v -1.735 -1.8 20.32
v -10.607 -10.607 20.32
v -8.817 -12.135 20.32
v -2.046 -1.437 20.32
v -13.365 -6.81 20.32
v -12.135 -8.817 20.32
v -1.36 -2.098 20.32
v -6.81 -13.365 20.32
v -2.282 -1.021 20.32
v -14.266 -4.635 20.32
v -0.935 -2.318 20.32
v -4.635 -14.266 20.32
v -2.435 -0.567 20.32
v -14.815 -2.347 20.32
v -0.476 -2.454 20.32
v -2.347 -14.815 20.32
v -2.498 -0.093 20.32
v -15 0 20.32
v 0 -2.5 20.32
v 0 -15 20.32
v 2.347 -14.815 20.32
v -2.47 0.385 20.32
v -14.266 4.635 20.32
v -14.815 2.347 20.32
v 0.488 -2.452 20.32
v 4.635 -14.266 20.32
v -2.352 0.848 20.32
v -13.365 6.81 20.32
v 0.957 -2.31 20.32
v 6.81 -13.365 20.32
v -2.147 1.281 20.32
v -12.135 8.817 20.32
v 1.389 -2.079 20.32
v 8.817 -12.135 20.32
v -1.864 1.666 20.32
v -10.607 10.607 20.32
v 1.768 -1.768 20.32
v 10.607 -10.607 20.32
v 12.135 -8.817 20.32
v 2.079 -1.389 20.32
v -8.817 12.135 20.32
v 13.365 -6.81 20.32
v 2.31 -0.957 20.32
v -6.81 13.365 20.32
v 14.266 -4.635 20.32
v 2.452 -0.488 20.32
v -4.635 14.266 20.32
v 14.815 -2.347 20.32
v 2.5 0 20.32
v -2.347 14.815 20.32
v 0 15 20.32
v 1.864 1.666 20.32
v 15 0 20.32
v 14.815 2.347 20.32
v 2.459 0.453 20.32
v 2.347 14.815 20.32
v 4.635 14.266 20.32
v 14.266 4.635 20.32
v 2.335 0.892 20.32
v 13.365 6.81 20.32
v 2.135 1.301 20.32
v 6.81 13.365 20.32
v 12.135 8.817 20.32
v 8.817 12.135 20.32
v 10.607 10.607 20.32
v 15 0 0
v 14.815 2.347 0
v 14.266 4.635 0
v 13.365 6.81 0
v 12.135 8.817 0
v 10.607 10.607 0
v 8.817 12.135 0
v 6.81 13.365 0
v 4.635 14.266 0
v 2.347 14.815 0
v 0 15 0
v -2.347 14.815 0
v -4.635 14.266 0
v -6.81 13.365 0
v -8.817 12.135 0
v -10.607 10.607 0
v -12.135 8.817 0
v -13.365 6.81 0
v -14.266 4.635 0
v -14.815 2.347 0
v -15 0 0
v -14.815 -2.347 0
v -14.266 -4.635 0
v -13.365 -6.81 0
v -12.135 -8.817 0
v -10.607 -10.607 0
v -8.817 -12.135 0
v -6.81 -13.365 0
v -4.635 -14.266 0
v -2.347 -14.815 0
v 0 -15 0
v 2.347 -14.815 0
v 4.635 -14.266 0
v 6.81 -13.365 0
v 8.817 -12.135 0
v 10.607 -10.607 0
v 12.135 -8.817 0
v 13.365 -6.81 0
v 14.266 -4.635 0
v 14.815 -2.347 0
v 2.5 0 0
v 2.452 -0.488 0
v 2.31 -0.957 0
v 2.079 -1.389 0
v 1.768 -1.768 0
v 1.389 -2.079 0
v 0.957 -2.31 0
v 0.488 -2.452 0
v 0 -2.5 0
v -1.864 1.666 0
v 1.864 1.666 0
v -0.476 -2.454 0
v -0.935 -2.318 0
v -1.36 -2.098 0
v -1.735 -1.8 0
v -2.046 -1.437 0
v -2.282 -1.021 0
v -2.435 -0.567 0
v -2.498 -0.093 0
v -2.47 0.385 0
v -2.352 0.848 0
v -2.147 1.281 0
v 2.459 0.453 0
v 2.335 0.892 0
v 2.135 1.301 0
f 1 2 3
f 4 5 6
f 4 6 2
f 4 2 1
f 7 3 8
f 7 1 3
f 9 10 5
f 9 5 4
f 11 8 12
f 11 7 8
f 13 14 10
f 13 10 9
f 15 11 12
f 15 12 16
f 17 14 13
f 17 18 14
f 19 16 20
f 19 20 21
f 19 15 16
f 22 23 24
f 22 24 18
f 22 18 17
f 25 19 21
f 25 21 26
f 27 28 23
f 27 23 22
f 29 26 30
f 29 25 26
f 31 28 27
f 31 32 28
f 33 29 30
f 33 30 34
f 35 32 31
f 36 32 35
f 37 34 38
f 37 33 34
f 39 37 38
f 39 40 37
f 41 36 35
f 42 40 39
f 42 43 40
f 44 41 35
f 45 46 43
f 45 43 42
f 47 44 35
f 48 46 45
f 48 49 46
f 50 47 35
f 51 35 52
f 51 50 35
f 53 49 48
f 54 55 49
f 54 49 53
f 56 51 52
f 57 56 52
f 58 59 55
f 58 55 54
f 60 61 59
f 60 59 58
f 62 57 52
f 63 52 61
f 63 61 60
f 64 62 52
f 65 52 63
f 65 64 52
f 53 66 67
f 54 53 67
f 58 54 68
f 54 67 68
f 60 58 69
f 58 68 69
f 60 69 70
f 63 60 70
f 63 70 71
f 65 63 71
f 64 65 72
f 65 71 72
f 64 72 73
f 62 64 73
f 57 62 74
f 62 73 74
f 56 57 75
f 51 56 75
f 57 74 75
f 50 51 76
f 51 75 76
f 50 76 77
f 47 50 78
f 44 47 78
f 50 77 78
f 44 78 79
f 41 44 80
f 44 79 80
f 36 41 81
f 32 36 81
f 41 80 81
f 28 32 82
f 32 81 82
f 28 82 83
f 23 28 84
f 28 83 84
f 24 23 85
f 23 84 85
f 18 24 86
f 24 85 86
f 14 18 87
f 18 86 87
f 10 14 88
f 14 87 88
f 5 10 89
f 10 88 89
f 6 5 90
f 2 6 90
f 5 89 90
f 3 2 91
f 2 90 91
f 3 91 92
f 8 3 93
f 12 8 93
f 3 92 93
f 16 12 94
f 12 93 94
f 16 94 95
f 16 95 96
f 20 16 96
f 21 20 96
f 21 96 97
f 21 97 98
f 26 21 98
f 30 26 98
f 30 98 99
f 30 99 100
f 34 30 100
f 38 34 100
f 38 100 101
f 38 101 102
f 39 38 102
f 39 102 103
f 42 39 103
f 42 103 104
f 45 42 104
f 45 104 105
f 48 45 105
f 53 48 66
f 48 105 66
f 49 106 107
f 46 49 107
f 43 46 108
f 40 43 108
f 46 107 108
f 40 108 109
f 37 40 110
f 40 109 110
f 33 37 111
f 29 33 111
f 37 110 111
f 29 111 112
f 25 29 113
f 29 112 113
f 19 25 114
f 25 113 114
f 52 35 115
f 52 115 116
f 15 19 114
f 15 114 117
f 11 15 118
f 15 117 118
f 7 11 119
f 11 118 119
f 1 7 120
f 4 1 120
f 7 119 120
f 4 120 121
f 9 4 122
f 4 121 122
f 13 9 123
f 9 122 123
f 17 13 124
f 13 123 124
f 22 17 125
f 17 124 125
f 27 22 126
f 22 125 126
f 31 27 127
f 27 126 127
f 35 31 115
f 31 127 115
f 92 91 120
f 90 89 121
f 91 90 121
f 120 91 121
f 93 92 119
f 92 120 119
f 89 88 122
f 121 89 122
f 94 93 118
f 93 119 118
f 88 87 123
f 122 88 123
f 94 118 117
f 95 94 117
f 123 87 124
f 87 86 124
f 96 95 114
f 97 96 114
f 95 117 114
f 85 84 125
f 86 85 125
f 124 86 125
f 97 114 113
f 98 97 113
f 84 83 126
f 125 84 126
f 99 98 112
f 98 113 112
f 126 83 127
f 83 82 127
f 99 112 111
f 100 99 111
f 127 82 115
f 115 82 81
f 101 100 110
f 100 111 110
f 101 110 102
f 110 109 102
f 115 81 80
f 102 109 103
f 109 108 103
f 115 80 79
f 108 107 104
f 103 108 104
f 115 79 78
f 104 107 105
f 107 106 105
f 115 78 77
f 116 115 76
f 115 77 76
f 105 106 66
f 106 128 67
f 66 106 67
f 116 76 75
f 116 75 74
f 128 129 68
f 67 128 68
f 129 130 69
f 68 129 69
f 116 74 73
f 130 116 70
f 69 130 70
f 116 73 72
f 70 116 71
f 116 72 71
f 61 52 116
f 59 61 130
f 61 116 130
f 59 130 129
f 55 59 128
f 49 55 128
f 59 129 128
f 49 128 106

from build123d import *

# Parameters (mm, degrees)
F0_R     = 15
F1_DEPTH = 20.32
F2_DEPTH = 20.32


with BuildPart() as f1:
    # F0 (on Top) → F1 (new body)
    with BuildSketch(Plane.XY):
        Circle(F0_R)
        with BuildLine():
            ThreePointArc((1.863643, 1.666384), (2.335499, 0.891878), (2.5, 0))
            ThreePointArc((2.5, 0), (1.767767, -1.767767), (0, -2.5))
            ThreePointArc((0, -2.5), (-2.2821, -1.020794), (-1.863643, 1.666384))
            ThreePointArc((-1.863643, 1.666384), (0, 2.5), (1.863643, 1.666384))
        make_face(mode=Mode.SUBTRACT)
    extrude(amount=F1_DEPTH)

    # F0 (on Top) → F2 (join)
    with BuildSketch(Plane.XY):
        with BuildLine():
            Line((0, 1.666384), (1.863643, 1.666384))
            ThreePointArc((1.863643, 1.666384), (0, 2.5), (-1.863643, 1.666384))
            Line((-1.863643, 1.666384), (0, 1.666384))
        make_face()
    extrude(amount=F2_DEPTH)


solid = f1.part
